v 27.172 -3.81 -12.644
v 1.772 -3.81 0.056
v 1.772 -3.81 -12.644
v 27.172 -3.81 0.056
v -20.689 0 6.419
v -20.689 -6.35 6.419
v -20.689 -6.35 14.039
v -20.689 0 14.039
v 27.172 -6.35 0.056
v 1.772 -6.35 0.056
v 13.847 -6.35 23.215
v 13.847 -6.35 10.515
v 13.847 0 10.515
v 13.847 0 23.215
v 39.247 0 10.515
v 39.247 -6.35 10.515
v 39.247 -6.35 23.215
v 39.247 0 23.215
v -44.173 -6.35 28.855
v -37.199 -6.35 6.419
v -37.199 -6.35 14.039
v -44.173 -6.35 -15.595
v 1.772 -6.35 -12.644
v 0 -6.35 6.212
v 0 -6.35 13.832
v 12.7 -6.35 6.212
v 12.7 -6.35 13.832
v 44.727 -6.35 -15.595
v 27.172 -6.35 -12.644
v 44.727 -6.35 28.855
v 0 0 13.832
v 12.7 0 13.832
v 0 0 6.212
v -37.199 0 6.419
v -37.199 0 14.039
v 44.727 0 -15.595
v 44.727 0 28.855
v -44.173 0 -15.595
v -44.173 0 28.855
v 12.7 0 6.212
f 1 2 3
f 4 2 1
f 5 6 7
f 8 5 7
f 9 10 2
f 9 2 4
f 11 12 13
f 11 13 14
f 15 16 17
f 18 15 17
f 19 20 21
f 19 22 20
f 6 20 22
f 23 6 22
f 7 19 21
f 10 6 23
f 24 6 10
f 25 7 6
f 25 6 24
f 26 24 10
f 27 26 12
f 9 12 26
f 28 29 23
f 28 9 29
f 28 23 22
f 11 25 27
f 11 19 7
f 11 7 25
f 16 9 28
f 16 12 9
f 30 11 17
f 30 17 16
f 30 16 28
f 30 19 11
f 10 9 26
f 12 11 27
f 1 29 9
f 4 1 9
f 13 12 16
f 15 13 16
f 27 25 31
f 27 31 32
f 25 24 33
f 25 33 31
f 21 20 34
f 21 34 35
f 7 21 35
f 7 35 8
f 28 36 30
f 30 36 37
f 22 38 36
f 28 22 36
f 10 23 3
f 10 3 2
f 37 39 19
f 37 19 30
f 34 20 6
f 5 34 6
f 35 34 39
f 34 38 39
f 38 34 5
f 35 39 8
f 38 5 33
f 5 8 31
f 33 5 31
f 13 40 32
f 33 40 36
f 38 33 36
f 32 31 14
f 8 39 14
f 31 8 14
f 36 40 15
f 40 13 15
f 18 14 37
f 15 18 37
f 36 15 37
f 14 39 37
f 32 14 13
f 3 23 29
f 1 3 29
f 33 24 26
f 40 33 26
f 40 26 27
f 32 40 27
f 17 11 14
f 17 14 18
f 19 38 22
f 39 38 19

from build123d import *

# Parameters (mm, degrees)
F0_W     = 88.9
F0_H     = 44.45
F1_DEPTH = 6.35
F2_W     = 25.4
F2_H     = 12.7
F3_DEPTH = 6.351
F4_W     = 12.7
F4_H     = 7.62
F5_DEPTH = 6.351
F6_W     = 25.4
F6_H     = 12.7
F7_DEPTH = 2.54
F8_W     = 16.51
F8_H     = 7.62
F9_DEPTH = 6.351


with BuildPart() as f1:
    # F0 (on Front) → F1 (new body)
    with BuildSketch(Plane.XZ):
        with Locations((0.276533, 6.62957)):
            Rectangle(F0_W, F0_H)
    extrude(amount=F1_DEPTH)

    # F2 (on face) → F3 (cut, through all)
    with BuildSketch(Plane.XZ.offset(6.35)):
        with Locations((26.547096, 16.865057)):
            Rectangle(F2_W, F2_H)
    extrude(amount=-F3_DEPTH, mode=Mode.SUBTRACT)

    # F4 (on face) → F5 (cut, through all)
    with BuildSketch(Plane.XZ.offset(6.35)):
        with Locations((6.35, 10.021638)):
            Rectangle(F4_W, F4_H)
    extrude(amount=-F5_DEPTH, mode=Mode.SUBTRACT)

    # F6 (on face) → F7 (cut)
    with BuildSketch(Plane.XZ.offset(6.35)):
        with Locations((14.471854, -6.293975)):
            Rectangle(F6_W, F6_H)
    extrude(amount=-F7_DEPTH, mode=Mode.SUBTRACT)

    # F8 (on face) → F9 (cut, through all)
    with BuildSketch(Plane.XZ.offset(6.35)):
        with Locations((-28.943709, 10.228814)):
            Rectangle(F8_W, F8_H)
    extrude(amount=-F9_DEPTH, mode=Mode.SUBTRACT)


solid = f1.part
